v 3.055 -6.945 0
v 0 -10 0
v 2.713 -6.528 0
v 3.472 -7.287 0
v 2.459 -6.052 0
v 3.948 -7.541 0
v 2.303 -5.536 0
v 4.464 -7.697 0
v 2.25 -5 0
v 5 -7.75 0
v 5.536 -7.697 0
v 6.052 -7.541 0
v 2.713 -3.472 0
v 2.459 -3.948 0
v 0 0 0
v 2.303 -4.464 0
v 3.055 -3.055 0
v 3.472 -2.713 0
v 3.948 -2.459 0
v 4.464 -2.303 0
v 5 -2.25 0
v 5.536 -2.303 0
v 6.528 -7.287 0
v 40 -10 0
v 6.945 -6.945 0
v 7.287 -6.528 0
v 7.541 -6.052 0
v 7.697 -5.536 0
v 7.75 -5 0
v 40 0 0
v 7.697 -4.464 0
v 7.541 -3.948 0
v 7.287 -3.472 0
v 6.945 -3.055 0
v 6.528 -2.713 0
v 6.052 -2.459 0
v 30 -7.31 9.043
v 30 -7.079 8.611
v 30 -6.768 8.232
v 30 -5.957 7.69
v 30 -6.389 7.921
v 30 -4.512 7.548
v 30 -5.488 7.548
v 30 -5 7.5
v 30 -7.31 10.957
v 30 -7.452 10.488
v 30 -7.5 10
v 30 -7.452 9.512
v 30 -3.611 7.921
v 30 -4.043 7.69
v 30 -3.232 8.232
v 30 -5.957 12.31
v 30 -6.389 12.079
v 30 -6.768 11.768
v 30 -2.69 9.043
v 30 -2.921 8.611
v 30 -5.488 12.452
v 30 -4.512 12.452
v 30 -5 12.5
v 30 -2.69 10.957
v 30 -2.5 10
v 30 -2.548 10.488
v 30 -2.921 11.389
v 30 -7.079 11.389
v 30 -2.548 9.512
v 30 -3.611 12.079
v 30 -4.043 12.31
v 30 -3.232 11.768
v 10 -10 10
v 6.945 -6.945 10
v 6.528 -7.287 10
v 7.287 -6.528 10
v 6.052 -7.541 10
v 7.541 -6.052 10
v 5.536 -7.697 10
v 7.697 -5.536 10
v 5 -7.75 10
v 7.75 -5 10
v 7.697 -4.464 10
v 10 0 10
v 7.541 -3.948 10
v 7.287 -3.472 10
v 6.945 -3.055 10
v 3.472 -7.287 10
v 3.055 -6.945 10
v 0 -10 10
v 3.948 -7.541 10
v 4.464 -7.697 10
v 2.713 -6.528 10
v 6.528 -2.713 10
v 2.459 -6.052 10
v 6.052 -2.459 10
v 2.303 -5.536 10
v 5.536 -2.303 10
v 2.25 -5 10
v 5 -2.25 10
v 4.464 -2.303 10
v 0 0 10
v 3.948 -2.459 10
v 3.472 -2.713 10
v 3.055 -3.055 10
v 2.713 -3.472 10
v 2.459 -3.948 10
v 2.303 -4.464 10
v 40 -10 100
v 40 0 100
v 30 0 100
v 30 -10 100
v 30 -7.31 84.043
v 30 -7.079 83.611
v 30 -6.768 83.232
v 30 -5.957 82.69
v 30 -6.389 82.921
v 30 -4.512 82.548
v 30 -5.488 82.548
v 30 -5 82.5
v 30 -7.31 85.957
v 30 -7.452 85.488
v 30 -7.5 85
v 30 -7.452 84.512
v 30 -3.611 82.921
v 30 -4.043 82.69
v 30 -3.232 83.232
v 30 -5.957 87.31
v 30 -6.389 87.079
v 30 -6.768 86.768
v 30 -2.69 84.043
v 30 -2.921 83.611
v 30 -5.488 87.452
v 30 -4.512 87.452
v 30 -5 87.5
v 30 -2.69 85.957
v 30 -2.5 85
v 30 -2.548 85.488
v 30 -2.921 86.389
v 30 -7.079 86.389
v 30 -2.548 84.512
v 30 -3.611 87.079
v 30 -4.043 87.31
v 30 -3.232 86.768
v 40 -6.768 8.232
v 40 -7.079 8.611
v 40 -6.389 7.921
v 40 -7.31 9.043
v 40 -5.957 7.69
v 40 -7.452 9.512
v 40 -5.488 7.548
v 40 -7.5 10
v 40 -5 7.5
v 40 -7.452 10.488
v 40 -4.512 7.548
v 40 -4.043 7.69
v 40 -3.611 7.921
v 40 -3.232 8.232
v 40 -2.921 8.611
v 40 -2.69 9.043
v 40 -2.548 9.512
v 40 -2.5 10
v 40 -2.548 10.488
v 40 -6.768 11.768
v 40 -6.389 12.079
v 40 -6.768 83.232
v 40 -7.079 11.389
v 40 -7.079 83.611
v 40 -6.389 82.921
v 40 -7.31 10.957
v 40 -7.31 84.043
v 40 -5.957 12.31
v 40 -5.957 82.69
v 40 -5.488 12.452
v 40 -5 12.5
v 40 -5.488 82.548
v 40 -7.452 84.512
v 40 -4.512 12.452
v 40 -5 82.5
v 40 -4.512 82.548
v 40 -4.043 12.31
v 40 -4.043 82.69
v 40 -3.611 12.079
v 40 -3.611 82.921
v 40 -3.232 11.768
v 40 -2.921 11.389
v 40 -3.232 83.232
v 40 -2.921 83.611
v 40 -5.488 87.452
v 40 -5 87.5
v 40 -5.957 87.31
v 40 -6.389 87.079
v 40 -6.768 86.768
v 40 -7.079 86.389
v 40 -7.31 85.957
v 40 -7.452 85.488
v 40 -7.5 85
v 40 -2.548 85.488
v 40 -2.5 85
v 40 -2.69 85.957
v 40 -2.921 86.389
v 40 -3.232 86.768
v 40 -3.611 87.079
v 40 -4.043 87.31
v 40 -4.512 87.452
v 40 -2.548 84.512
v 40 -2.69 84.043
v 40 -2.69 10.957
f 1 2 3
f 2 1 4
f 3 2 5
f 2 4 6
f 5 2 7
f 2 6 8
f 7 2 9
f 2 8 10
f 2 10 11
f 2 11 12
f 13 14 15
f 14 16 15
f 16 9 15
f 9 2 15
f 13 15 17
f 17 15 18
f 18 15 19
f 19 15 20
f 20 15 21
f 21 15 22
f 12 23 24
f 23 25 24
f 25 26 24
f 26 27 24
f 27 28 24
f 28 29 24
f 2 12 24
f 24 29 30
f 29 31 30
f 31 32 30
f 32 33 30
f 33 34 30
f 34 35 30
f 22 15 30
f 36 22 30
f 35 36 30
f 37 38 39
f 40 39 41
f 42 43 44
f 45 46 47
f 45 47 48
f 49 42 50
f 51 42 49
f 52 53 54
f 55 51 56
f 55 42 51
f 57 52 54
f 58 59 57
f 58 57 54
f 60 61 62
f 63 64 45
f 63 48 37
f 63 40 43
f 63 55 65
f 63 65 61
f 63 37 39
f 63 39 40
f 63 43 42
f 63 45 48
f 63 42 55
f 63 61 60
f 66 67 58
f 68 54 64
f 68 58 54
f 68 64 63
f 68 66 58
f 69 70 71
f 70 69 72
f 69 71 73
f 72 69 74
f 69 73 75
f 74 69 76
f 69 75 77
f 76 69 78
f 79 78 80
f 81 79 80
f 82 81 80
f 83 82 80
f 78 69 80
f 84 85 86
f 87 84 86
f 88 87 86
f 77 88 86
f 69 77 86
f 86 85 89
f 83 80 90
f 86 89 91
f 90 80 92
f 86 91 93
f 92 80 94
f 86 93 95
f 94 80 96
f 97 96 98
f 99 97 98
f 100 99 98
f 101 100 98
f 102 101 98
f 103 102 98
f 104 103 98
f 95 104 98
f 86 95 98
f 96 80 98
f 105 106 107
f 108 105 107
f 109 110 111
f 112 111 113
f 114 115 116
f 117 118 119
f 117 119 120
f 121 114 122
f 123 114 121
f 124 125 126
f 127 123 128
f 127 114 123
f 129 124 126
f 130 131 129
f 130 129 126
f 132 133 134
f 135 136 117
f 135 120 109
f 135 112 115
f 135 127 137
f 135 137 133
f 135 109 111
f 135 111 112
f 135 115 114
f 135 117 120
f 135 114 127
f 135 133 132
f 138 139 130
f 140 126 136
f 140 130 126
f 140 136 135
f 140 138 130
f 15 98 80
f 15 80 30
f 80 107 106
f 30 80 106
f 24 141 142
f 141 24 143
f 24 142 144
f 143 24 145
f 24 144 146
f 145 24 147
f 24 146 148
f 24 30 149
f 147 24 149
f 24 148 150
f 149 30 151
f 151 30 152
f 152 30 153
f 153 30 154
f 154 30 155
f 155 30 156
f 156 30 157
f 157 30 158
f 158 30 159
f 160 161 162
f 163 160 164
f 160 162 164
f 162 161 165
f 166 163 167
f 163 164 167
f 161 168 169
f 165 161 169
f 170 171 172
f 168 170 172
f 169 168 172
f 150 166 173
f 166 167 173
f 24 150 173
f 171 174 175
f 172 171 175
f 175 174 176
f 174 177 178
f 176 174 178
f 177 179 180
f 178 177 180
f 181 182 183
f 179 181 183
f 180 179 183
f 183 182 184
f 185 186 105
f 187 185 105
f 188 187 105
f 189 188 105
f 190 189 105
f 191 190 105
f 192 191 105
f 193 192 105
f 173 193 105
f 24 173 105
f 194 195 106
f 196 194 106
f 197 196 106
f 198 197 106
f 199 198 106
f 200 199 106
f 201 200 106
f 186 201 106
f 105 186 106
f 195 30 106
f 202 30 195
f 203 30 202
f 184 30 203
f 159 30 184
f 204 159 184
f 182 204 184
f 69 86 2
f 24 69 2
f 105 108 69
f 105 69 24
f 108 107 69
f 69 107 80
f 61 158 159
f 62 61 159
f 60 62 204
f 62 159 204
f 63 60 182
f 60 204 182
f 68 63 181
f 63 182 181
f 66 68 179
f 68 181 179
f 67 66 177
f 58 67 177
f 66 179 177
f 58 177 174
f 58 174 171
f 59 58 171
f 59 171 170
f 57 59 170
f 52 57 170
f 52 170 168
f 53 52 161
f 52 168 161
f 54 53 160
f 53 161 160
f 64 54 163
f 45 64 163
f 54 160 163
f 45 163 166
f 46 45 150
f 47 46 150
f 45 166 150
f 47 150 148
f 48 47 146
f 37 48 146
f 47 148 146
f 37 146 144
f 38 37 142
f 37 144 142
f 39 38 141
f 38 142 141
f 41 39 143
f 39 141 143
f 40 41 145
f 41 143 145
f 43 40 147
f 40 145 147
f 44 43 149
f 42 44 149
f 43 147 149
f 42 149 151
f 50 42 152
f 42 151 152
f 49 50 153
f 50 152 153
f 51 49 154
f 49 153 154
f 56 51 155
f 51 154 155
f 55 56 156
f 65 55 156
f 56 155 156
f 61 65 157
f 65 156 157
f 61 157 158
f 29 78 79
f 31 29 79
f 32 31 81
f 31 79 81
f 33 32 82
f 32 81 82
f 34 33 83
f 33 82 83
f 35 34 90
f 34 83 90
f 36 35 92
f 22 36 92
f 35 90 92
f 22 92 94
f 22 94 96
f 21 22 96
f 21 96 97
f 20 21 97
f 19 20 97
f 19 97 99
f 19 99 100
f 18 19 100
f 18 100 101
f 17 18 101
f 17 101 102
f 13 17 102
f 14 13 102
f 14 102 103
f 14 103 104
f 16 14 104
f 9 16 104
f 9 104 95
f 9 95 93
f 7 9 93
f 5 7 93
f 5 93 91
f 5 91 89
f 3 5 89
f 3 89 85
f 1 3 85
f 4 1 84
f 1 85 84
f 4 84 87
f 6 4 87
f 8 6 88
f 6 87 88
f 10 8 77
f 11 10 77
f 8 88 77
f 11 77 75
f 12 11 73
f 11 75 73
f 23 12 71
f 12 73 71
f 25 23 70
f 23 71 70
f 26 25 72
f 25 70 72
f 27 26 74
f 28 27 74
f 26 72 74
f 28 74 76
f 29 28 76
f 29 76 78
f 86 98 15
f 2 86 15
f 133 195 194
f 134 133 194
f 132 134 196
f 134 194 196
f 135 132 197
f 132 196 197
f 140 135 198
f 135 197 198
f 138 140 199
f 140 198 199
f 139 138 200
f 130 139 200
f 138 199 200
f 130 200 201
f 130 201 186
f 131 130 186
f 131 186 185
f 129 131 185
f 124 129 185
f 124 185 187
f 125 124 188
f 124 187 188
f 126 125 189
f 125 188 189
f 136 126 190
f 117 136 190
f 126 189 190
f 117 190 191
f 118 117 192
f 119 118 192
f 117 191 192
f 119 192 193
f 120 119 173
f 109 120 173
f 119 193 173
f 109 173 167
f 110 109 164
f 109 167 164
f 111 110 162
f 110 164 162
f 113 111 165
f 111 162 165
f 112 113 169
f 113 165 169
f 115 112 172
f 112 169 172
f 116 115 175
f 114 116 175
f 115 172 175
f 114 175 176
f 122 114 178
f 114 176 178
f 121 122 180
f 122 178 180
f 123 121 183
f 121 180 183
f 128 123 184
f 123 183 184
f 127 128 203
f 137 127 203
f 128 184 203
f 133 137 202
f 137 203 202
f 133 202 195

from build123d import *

# Parameters (mm, degrees)
F1_DEPTH = 10
F2_R     = 2.75
F3_DEPTH = 25
F4_R     = 2.5
F5_DEPTH = 10


with BuildPart() as f1:
    # F0 (on Front) → F1 (new body)
    with BuildSketch(Plane.XZ):
        Polygon((0, 10), (0, 0), (40, 0), (40, 100), (30, 100), (10, 10), align=None)
    extrude(amount=F1_DEPTH)

    # F2 (on face) → F3 (cut)
    with BuildSketch(Plane.XY.offset(10)):
        with Locations((5, -5)):
            Circle(F2_R)
    extrude(amount=-F3_DEPTH, mode=Mode.SUBTRACT)

    # F4 (on face) → F5 (cut)
    with BuildSketch(Plane.YZ.offset(40)):
        with Locations((-5, 85)):
            Circle(F4_R)
        with Locations((-5, 10)):
            Circle(F4_R)
    extrude(amount=-F5_DEPTH, mode=Mode.SUBTRACT)


solid = f1.part
